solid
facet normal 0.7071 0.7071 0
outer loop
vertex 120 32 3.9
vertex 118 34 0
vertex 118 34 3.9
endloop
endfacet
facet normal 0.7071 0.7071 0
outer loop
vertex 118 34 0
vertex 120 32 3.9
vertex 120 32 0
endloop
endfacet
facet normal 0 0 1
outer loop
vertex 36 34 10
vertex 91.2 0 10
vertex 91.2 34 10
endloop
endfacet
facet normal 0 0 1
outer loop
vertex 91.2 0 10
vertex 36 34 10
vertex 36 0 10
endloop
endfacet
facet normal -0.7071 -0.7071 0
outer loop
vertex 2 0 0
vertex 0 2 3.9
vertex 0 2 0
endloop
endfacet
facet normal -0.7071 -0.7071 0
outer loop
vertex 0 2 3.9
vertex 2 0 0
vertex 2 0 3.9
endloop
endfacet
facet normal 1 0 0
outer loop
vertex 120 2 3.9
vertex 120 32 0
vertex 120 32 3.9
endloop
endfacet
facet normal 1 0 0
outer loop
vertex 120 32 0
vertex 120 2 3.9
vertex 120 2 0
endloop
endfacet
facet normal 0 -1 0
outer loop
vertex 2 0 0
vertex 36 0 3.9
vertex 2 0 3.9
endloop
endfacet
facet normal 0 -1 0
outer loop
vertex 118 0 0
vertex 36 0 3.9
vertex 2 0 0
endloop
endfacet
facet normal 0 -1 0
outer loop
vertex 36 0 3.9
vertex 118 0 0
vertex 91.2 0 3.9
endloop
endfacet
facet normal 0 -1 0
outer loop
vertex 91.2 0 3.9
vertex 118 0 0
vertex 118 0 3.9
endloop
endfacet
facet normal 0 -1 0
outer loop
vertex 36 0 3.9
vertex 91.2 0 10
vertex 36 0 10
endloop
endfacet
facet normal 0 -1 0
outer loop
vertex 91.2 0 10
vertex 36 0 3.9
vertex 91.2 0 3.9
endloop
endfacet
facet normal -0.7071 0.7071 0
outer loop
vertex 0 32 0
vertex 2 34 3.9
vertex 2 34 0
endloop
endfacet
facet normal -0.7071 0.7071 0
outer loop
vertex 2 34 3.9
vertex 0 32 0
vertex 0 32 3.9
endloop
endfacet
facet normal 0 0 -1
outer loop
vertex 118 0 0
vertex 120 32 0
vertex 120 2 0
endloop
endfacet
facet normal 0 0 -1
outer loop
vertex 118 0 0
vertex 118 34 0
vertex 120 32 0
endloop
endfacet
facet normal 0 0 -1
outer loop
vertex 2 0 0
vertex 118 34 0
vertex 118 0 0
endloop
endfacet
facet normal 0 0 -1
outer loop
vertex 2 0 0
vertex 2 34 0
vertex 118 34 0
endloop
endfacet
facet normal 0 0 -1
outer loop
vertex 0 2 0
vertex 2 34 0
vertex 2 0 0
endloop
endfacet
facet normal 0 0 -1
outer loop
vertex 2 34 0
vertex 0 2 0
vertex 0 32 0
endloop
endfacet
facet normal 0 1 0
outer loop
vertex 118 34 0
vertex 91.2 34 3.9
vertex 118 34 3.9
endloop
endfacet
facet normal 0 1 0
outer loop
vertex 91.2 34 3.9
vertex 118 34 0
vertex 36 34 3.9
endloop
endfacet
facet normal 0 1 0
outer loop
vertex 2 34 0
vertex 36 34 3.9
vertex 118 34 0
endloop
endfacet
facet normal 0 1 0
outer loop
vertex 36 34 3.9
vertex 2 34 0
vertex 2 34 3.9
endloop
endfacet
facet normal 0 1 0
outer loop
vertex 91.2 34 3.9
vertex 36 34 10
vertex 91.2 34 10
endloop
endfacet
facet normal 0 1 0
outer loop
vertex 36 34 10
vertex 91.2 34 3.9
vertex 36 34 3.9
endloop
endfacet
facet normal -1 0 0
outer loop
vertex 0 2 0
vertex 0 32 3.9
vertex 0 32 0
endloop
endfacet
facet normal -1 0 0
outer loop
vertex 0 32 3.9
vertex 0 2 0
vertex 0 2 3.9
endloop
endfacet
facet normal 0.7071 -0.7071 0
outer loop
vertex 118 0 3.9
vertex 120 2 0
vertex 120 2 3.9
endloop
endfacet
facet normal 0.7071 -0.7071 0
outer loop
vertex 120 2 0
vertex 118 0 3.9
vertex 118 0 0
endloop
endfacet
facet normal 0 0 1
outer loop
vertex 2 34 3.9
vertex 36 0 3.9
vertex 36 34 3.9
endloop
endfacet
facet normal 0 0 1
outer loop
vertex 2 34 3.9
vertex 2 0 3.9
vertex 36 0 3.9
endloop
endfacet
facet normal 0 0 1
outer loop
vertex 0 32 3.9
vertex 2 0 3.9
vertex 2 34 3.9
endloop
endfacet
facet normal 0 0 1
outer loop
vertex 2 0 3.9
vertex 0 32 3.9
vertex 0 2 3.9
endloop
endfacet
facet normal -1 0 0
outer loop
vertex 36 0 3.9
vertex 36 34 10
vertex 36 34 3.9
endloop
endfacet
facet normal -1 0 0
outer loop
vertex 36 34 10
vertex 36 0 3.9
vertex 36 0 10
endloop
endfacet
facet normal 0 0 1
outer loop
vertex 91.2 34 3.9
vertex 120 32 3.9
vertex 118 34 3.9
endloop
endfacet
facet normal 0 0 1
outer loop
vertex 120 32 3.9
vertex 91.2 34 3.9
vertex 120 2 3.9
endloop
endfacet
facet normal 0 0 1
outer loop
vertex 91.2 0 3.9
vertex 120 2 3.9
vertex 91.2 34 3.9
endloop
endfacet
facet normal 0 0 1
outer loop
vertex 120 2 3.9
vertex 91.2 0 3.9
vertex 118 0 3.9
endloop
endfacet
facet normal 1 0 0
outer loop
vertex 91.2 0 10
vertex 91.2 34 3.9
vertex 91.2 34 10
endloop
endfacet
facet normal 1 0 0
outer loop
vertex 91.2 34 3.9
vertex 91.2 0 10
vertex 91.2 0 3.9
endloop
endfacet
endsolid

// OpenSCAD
$fn = 32;

// ----------------------------------------------------------------------
// Stepped bar: centerstep, 120 x 34 x 10/3.9 mm
// ----------------------------------------------------------------------

// --- parameters (mm) ---
bar_l = 120;              // bar length, X
bar_w = 34;               // bar width, Y
plate_t = 10;             // thickness of the thick zone, Z
thin_t = 3.9;             // thickness of the thin zone
corner_c = 2;             // corner chamfer of the bar
step_cut = 6.1;           // material removed from the thin zone
thick_from = 36;          // start of the thick middle zone
thick_to = 91.2;          // end of the thick middle zone
depth_1 = 6.1;            // depth of cut 1 from the top face
depth_2 = 6.1;            // depth of cut 2 from the top face

profile = [[2, 0], [118, 0], [120, 2], [120, 32], [118, 34], [2, 34], [0, 32], [0, 2]];  // primary outline, 8 points, counter clockwise
void_1 = [[-1, -1], [36, -1], [36, 35], [-1, 35]];  // thin left end, 4 points
void_2 = [[91.2, -1], [121, -1], [121, 35], [91.2, 35]];  // thin right end, 4 points

// --- the one profile operation ---
difference() {
  linear_extrude(height = plate_t) polygon(points = profile);
  translate([0, 0, plate_t - depth_1])
    linear_extrude(height = depth_1 + 1) polygon(points = void_1);
  translate([0, 0, plate_t - depth_2])
    linear_extrude(height = depth_2 + 1) polygon(points = void_2);
}
